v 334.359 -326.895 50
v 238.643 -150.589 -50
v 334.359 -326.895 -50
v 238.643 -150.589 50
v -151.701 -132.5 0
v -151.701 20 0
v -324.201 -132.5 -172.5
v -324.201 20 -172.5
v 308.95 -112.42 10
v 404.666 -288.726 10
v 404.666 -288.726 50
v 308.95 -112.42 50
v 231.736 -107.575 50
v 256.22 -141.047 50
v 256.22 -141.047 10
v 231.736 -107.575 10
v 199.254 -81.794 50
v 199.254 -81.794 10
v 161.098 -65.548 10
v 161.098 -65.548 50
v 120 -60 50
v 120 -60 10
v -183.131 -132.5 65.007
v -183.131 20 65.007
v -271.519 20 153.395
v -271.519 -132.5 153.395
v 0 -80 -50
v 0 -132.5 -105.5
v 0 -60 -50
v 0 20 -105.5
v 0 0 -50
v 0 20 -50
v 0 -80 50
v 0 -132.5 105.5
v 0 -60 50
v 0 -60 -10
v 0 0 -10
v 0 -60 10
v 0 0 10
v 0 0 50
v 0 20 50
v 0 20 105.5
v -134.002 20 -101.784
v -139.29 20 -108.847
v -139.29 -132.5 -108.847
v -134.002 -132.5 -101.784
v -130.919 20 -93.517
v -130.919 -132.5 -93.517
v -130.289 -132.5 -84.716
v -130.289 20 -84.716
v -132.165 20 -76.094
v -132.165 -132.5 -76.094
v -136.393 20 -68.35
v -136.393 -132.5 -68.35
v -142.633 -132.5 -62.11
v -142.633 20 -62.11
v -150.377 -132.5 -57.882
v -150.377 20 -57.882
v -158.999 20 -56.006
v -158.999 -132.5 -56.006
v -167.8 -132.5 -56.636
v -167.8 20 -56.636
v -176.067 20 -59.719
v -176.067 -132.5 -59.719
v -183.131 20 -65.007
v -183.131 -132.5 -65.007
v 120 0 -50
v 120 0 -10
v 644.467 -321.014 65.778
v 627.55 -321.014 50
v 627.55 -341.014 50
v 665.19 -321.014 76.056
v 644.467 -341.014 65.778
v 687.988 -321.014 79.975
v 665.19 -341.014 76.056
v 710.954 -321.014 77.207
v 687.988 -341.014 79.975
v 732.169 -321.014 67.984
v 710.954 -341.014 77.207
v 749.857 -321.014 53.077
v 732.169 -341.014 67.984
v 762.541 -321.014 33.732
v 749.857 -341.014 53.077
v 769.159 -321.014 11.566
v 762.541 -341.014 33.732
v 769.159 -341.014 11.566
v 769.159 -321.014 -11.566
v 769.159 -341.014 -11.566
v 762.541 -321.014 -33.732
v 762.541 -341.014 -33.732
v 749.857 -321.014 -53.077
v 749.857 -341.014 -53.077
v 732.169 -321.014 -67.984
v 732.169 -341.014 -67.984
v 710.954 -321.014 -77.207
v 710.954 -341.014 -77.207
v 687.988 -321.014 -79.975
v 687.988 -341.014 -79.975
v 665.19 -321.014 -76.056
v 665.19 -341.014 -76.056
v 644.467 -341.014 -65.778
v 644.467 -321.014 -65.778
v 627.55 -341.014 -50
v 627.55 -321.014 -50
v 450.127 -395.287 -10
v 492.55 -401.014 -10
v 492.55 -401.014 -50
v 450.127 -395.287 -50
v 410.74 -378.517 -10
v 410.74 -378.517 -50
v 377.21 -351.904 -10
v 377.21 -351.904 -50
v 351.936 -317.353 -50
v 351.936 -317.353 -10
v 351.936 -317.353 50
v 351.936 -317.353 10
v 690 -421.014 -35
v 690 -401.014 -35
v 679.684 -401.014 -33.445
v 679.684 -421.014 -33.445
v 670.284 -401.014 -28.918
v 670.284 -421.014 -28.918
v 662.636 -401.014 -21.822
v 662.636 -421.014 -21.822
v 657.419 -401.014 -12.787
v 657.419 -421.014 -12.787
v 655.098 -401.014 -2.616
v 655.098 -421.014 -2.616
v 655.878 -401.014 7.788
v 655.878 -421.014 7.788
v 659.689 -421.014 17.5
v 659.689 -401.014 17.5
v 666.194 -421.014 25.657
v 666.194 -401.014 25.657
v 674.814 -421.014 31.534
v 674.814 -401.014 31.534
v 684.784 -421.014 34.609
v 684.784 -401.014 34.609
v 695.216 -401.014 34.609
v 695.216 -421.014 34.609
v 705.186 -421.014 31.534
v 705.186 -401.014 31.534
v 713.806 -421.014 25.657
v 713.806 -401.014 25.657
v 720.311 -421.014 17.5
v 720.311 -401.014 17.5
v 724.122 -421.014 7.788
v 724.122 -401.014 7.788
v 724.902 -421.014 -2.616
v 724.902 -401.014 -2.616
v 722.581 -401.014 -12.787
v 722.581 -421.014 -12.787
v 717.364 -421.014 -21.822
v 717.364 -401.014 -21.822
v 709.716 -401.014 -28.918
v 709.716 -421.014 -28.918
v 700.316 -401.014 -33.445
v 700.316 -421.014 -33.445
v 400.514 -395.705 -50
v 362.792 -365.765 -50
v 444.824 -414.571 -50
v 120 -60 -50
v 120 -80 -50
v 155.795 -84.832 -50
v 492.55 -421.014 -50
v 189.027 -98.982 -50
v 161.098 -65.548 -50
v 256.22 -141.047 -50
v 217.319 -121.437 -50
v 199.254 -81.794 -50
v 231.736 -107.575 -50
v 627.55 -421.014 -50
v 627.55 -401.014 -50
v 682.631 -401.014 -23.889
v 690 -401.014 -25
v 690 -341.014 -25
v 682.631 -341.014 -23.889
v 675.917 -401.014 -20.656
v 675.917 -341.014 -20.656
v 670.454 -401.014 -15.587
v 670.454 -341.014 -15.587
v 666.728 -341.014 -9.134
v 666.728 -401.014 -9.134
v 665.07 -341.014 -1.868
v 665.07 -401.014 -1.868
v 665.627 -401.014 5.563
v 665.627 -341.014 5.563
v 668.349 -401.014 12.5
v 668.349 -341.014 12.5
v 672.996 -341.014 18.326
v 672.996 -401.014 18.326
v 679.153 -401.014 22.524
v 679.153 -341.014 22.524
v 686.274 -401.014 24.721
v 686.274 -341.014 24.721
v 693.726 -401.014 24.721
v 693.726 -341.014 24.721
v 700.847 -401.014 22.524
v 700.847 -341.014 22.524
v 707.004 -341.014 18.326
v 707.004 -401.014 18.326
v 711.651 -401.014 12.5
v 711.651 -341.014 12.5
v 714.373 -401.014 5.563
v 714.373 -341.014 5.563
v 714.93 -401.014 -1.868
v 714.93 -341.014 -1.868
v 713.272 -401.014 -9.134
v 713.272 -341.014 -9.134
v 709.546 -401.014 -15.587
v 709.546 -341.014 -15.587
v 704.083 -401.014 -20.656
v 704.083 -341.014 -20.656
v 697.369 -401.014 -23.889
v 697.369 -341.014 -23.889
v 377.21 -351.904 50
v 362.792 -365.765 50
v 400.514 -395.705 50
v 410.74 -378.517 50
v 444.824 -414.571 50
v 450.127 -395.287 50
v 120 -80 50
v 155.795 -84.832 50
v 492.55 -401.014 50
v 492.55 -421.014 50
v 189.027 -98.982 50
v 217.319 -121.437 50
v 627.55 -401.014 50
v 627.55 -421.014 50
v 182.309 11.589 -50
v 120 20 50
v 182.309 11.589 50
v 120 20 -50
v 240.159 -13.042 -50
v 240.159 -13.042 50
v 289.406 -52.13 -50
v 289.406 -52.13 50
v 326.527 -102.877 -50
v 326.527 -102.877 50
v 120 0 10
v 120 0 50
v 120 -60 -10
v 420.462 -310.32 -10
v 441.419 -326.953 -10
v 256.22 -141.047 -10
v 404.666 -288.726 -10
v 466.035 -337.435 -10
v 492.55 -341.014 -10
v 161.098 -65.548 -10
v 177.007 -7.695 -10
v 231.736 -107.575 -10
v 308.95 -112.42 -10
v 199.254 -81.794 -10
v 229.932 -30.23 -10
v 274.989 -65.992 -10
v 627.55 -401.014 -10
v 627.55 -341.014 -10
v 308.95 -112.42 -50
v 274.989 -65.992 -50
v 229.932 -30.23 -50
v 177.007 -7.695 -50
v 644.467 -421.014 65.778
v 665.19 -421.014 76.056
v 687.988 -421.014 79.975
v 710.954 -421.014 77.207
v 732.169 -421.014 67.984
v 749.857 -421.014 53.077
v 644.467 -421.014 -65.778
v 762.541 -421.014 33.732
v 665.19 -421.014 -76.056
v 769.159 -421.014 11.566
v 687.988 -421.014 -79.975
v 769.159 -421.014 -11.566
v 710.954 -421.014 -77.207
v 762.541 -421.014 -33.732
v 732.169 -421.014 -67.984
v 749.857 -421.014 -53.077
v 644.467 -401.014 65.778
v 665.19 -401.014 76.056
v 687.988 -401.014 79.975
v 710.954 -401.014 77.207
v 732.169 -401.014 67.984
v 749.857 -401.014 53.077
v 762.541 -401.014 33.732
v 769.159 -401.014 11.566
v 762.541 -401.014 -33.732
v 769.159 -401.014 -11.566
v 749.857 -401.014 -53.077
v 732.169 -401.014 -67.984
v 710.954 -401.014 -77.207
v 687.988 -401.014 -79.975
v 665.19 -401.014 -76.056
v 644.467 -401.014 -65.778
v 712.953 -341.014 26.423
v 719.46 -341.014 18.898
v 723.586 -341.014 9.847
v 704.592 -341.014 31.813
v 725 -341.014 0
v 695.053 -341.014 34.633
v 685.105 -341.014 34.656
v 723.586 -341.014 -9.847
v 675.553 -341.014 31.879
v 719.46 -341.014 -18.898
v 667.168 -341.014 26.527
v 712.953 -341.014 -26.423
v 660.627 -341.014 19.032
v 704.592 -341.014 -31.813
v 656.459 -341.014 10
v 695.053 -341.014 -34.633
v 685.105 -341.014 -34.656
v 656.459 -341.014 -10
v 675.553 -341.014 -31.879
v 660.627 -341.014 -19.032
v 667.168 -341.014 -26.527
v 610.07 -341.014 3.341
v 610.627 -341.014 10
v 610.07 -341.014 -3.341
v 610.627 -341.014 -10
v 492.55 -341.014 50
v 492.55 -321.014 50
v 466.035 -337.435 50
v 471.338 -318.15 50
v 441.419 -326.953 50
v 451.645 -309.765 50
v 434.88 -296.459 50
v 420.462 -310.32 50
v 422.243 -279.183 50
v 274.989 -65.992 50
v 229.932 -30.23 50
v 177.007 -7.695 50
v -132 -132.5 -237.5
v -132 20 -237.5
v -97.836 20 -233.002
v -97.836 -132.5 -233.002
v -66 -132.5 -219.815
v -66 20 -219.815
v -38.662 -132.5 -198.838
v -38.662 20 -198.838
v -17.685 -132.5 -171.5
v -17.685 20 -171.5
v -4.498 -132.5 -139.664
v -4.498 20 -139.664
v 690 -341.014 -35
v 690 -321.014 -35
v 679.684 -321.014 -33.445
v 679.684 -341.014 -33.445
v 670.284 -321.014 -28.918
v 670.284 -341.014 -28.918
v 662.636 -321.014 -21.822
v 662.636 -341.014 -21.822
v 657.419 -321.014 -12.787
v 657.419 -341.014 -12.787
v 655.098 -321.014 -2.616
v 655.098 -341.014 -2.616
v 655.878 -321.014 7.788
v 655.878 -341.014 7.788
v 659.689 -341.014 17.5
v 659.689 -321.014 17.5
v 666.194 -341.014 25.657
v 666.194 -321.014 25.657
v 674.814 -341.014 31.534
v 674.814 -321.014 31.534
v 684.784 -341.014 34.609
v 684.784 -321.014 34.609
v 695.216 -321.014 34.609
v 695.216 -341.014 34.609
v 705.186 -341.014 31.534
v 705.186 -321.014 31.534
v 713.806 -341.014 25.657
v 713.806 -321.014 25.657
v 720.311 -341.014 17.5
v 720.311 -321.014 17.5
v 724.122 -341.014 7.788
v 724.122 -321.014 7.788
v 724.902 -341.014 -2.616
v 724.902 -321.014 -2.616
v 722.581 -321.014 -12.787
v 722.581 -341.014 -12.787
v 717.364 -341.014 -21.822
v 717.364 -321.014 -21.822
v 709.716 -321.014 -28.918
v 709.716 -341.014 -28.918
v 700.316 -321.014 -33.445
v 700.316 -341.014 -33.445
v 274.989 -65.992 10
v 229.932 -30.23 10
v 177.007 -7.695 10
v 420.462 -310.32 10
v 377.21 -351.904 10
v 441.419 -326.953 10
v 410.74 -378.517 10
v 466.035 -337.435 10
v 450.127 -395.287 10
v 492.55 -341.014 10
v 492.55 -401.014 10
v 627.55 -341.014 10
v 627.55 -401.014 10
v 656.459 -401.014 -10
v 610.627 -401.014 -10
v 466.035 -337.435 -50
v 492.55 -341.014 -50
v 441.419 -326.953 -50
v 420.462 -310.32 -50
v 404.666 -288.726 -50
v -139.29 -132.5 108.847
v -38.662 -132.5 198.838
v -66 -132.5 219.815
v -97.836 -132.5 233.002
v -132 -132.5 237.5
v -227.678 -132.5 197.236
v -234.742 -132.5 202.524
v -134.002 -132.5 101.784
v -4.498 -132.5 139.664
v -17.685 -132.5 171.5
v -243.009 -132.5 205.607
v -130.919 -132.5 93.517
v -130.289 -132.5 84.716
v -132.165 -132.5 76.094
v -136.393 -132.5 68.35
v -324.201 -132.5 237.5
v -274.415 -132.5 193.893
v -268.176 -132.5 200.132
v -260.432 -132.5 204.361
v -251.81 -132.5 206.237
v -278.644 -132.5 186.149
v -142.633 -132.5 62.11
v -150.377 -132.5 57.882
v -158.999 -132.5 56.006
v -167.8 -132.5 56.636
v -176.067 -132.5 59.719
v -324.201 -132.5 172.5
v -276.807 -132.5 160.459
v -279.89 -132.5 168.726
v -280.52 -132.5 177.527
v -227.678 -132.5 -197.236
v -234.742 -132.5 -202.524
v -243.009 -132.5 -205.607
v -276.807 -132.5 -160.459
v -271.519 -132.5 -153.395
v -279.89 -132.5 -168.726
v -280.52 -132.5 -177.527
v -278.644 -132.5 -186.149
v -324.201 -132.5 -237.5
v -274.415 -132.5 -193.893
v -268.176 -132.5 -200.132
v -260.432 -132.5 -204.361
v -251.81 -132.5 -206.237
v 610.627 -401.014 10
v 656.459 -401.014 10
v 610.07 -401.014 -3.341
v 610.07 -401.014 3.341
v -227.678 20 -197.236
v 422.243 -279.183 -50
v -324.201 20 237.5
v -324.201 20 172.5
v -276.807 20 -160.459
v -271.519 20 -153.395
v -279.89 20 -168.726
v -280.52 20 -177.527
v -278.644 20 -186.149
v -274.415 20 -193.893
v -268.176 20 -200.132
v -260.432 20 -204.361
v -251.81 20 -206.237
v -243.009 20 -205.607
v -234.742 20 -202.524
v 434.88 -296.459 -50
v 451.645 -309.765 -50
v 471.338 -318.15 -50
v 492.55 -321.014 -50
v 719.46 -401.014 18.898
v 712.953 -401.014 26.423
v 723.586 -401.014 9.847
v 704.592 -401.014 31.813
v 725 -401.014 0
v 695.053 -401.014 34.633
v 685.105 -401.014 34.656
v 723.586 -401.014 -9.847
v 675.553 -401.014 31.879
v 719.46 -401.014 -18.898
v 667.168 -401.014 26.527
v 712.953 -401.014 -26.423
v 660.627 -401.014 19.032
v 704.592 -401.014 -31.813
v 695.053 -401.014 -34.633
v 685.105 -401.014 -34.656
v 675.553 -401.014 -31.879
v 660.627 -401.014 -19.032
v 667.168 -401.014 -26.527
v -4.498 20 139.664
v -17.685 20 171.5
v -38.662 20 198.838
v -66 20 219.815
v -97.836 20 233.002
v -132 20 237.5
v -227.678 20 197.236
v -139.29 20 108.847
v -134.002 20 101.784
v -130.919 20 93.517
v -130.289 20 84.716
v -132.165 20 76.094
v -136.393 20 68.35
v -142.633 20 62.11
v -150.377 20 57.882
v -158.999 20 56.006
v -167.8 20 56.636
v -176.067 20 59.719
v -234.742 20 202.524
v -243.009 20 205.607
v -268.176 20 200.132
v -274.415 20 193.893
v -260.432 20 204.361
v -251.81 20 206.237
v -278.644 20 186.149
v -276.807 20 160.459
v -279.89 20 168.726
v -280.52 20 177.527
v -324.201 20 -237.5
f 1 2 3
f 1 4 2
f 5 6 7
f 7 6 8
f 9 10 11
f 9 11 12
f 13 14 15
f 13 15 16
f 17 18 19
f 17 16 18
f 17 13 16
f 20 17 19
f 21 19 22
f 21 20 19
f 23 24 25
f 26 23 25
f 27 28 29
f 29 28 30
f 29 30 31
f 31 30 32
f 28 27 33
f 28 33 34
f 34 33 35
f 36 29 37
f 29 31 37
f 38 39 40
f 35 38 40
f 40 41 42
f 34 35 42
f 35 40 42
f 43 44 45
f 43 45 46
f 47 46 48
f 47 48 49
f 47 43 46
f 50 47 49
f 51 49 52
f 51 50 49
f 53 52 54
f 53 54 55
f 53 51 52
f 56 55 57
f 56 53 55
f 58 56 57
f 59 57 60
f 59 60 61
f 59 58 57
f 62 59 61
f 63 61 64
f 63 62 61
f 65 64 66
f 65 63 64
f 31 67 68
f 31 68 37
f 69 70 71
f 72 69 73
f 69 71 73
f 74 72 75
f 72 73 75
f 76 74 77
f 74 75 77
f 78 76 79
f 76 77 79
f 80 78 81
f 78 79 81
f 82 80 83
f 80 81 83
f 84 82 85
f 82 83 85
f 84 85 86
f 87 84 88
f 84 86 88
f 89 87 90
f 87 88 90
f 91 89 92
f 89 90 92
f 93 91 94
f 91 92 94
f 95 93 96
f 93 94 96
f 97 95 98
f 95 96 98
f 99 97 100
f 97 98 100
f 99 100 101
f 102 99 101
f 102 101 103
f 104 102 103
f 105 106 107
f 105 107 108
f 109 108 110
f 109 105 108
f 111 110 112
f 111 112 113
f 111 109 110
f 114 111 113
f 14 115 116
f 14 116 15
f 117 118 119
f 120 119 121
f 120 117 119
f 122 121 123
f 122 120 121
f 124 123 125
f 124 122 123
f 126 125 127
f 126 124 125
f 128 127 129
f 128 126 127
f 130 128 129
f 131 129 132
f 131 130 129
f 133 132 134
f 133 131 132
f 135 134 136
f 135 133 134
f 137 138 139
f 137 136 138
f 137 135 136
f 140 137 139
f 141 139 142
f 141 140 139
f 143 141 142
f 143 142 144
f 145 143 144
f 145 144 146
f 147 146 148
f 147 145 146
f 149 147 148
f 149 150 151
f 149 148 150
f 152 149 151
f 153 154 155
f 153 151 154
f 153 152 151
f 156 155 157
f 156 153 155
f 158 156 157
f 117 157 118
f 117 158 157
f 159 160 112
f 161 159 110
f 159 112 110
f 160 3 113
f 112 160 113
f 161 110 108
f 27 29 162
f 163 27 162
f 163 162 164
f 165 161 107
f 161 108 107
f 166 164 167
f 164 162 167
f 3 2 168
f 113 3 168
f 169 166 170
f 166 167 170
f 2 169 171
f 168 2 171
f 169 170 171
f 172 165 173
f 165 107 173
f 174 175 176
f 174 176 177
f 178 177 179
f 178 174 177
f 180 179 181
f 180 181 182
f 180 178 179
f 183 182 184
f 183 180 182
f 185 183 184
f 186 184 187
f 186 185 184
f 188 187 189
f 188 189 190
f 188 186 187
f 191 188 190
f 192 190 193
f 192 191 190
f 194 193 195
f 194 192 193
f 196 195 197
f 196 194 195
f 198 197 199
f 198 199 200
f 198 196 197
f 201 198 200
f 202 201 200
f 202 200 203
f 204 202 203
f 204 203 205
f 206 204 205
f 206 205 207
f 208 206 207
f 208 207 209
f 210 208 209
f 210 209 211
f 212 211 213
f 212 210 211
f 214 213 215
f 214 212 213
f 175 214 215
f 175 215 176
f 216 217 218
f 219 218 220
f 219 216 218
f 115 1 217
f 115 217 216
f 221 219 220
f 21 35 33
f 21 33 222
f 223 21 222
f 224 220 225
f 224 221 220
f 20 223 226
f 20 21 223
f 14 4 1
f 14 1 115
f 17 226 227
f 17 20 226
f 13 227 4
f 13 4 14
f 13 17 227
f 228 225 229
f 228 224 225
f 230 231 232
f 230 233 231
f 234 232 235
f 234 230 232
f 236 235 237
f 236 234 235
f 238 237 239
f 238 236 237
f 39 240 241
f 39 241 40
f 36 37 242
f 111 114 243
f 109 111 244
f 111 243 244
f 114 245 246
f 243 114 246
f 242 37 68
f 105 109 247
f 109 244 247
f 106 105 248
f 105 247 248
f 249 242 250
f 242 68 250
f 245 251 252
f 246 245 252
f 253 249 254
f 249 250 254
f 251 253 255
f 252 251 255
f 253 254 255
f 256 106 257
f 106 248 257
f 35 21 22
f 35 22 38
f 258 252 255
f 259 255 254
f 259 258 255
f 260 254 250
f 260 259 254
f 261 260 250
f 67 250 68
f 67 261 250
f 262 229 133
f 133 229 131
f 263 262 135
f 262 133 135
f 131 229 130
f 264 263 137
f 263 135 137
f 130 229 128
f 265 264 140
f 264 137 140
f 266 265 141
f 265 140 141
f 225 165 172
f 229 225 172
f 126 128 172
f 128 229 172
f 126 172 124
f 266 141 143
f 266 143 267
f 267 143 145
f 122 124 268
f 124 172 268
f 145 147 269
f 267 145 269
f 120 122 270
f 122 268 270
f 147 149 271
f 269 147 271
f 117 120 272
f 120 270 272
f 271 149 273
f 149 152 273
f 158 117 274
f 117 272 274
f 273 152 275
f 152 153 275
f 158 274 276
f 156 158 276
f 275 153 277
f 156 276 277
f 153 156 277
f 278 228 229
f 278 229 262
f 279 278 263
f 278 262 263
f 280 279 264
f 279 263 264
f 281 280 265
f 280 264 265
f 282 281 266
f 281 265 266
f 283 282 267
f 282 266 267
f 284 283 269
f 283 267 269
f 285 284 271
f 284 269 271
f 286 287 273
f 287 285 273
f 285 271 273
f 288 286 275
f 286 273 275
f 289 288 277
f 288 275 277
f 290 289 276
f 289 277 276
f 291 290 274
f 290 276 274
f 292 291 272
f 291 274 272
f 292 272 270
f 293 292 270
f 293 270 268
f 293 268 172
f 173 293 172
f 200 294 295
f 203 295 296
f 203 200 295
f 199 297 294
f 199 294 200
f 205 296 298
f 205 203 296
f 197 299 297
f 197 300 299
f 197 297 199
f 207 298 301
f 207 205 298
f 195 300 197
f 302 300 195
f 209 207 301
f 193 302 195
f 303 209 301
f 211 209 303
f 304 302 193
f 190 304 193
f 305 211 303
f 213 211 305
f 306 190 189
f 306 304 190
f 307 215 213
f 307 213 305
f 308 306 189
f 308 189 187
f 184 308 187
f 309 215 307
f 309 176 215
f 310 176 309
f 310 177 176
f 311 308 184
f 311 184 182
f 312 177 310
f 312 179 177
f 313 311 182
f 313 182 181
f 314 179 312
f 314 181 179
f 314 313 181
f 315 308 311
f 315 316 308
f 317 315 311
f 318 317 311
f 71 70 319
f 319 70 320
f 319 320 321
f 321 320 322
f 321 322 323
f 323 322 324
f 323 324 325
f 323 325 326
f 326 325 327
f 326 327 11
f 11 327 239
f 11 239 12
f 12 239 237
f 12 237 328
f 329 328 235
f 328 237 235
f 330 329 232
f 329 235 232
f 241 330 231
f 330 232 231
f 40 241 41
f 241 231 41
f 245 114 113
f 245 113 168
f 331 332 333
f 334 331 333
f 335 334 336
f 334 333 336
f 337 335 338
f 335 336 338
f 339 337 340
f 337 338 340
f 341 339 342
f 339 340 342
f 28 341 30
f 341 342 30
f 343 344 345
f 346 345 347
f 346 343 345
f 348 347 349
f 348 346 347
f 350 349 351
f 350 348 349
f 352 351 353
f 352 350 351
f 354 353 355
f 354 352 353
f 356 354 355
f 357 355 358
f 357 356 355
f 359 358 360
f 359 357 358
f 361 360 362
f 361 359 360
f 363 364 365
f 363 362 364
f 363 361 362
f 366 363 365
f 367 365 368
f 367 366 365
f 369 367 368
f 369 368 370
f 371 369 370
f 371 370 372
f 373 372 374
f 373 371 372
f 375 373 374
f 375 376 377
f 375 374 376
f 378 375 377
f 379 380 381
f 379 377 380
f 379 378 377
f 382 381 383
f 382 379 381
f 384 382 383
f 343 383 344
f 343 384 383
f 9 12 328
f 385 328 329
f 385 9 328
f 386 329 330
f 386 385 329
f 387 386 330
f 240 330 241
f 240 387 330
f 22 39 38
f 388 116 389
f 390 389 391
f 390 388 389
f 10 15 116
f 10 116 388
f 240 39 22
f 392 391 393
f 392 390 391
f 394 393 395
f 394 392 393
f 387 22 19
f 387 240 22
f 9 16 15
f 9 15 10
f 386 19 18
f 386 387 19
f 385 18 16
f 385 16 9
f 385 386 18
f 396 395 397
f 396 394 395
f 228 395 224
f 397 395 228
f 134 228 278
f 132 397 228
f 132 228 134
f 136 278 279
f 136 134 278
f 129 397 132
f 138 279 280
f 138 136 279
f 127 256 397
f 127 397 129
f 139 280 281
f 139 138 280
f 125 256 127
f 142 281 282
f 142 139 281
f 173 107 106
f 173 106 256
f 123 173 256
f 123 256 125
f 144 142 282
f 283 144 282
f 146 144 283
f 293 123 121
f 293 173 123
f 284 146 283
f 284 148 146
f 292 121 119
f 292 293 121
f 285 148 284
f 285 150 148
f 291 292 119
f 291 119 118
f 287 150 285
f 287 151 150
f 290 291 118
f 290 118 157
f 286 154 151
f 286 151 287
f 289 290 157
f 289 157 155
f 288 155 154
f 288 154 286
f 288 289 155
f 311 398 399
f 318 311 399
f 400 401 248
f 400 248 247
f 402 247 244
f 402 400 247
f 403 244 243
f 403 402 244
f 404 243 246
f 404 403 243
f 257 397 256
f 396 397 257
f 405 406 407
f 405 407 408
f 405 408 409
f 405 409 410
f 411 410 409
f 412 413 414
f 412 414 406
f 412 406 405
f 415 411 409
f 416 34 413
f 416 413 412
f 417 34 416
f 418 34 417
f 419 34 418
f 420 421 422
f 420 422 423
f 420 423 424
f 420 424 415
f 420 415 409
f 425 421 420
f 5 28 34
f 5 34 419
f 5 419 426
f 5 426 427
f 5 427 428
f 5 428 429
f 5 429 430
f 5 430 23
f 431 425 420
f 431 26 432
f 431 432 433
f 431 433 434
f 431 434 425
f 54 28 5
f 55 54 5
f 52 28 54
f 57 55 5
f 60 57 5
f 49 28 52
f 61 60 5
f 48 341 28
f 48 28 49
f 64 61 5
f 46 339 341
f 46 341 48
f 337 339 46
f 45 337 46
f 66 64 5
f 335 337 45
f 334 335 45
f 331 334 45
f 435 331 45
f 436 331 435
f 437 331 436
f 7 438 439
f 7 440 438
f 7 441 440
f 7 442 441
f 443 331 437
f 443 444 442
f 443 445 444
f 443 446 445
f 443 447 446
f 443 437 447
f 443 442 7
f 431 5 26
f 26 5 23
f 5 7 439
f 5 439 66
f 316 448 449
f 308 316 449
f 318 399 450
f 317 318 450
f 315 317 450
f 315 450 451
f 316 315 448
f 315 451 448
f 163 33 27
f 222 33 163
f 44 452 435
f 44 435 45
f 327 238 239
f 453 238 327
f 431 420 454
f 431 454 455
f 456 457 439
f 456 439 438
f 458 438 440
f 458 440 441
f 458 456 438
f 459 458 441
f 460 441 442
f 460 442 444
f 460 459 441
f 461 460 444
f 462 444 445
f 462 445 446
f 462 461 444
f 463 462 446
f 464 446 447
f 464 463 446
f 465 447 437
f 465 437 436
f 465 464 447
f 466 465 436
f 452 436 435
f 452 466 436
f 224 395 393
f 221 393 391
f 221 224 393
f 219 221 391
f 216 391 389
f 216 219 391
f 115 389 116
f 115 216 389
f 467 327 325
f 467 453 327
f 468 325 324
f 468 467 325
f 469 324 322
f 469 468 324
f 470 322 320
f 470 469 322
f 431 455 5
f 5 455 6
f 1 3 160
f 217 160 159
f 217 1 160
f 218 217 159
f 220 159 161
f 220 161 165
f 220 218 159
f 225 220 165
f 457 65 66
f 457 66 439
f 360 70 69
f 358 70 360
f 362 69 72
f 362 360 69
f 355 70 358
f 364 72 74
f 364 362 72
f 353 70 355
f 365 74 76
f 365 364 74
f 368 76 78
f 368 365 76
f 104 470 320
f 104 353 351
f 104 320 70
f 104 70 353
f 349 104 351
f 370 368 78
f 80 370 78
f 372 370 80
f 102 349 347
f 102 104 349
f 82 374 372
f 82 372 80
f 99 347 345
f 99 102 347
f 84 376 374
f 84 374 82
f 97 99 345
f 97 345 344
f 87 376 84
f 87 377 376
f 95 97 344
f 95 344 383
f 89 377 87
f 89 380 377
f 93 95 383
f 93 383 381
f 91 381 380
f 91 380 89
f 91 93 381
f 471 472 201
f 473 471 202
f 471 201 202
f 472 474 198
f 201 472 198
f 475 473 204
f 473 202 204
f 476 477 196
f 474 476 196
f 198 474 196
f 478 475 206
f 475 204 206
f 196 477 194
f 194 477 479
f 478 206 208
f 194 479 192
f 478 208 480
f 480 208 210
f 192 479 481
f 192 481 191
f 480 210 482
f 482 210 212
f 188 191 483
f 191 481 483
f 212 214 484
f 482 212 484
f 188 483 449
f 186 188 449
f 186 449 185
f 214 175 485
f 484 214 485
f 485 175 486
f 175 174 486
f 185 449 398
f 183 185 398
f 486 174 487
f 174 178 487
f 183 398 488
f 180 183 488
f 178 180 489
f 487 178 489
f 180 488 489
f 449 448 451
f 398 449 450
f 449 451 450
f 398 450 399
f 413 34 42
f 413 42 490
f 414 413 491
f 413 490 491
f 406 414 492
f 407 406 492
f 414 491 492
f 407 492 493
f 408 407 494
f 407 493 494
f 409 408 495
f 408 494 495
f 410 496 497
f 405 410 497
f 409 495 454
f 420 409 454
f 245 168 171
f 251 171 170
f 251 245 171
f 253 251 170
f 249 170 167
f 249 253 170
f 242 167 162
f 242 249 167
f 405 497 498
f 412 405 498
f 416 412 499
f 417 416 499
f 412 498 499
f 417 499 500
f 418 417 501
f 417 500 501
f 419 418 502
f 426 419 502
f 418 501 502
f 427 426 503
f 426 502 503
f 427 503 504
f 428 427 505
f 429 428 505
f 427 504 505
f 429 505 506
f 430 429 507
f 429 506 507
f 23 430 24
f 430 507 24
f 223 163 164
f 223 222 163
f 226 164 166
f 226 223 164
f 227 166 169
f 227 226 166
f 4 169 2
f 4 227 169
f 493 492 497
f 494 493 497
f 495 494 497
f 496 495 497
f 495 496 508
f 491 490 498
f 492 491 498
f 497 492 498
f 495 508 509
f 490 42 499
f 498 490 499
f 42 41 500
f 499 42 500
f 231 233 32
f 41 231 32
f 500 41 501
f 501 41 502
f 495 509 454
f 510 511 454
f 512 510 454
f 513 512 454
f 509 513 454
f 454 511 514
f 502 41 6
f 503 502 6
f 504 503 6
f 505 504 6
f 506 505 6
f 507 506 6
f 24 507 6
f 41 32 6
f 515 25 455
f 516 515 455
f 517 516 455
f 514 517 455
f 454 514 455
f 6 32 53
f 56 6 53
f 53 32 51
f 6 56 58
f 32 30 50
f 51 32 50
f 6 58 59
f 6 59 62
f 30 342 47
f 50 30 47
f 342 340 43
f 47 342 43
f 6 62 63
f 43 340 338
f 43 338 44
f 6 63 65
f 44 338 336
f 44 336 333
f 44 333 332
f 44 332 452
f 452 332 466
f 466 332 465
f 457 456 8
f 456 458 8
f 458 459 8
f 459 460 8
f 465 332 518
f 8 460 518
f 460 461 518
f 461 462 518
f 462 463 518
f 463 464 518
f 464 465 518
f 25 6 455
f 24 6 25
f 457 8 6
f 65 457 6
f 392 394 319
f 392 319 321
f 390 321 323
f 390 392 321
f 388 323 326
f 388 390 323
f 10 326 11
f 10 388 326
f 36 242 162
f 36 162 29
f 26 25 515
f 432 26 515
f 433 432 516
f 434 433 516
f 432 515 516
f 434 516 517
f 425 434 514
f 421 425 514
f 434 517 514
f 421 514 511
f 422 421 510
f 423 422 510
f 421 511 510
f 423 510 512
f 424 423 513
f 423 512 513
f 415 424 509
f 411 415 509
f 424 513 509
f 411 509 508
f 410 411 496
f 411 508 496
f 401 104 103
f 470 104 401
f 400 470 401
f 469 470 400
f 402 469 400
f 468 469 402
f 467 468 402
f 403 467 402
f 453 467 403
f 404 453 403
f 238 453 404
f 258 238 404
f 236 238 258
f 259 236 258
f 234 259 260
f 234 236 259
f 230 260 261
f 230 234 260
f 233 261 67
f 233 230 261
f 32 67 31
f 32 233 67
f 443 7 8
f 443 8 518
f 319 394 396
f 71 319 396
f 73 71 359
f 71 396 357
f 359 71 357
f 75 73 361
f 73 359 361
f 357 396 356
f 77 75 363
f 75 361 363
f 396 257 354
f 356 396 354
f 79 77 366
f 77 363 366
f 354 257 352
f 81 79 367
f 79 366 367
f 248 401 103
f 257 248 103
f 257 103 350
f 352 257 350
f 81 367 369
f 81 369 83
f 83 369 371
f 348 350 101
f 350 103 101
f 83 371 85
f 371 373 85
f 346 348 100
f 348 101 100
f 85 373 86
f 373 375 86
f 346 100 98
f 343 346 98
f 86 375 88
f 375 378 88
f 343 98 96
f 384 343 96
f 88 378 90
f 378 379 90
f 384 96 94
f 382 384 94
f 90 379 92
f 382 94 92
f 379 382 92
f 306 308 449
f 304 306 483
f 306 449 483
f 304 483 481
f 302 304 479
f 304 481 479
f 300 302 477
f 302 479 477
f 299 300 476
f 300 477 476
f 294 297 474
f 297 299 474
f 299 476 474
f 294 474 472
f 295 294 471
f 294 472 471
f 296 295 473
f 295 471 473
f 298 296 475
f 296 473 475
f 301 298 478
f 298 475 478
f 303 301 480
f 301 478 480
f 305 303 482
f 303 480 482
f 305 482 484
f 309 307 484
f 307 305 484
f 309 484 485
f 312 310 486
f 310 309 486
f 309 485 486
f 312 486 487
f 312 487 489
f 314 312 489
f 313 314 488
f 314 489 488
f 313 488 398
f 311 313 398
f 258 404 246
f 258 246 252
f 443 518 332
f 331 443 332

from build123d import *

# Parameters (mm, degrees)
BOSS_EXTRUDE1_DEPTH = 10
BOSS_EXTRUDE2_DEPTH = 50
BOSS_EXTRUDE5_START = 20
BOSS_EXTRUDE5_DEPTH = 152.5
BOSS_EXTRUDE6_START = -421.013827
SKETCH5_3_R         = 80
SKETCH5_3_R_2       = 35
BOSS_EXTRUDE6_DEPTH = 20
BOSS_EXTRUDE7_START = -341.013827
SKETCH5_4_R         = 80
SKETCH5_4_R_2       = 35
BOSS_EXTRUDE7_DEPTH = 20
BOSS_EXTRUDE8_START = -401.013827
SKETCH5_5_R         = 35
SKETCH5_5_R_2       = 25
BOSS_EXTRUDE8_DEPTH = 60


with BuildPart() as part:
    # Sketch3 → Boss-Extrude1 (new, symmetric)
    with BuildSketch(Plane.XY):
        with BuildLine():
            Line((256.220121409, -141.046781521), (351.935681127, -317.352633161))
            ThreePointArc((351.935681127, -317.352633161), (410.739881395, -378.516934204), (492.55, -401.013826989))
            Line((492.55, -401.013826989), (627.55, -401.013826989))
            Line((627.55, -401.013826989), (627.55, -341.013826989))
            Line((627.55, -341.013826989), (492.55, -341.013826989))
            ThreePointArc((492.55, -341.013826989), (441.418675872, -326.953268998), (404.666050704, -288.725580846))
            Line((404.666050704, -288.725580846), (308.950490986, -112.419729206))
            ThreePointArc((308.950490986, -112.419729206), (229.932346876, -30.23019968), (120, 0))
            Line((120, 0), (0, 0))
            Line((0, 0), (0, -60))
            Line((0, -60), (120, -60))
            ThreePointArc((120, -60), (199.253552399, -81.793864886), (256.220121409, -141.046781521))
        make_face()
    extrude(amount=BOSS_EXTRUDE1_DEPTH, both=True)

    # Sketch3<3> → Boss-Extrude2 (add, symmetric)
    with BuildSketch(Plane.XY):
        with BuildLine():
            ThreePointArc((422.242840563, -279.183230075), (451.644940697, -309.765380596), (492.55, -321.013826989))
            Line((492.55, -321.013826989), (627.55, -321.013826989))
            Line((627.55, -321.013826989), (627.55, -341.013826989))
            Line((627.55, -341.013826989), (492.55, -341.013826989))
            ThreePointArc((492.55, -341.013826989), (441.418675872, -326.953268998), (404.666050704, -288.725580846))
            Line((404.666050704, -288.725580846), (308.950490986, -112.419729206))
            ThreePointArc((308.950490986, -112.419729206), (229.932346876, -30.23019968), (120, 0))
            Line((120, 0), (0, 0))
            Line((0, 0), (0, 20))
            Line((0, 20), (120, 20))
            ThreePointArc((120, 20), (240.158611702, -13.042311278), (326.527280845, -102.877378435))
            Line((326.527280845, -102.877378435), (422.242840563, -279.183230075))
        make_face()
        with BuildLine():
            Line((238.643331549, -150.589132292), (334.358891267, -326.894983932))
            ThreePointArc((334.358891267, -326.894983932), (400.513616569, -395.704822605), (492.55, -421.013826989))
            Line((492.55, -421.013826989), (627.55, -421.013826989))
            Line((627.55, -421.013826989), (627.55, -401.013826989))
            Line((627.55, -401.013826989), (492.55, -401.013826989))
            ThreePointArc((492.55, -401.013826989), (410.739881395, -378.516934204), (351.935681127, -317.352633161))
            Line((351.935681127, -317.352633161), (256.220121409, -141.046781521))
            ThreePointArc((256.220121409, -141.046781521), (199.253552399, -81.793864886), (120, -60))
            Line((120, -60), (0, -60))
            Line((0, -60), (0, -80))
            Line((0, -80), (120, -80))
            ThreePointArc((120, -80), (189.027287573, -98.981753287), (238.643331549, -150.589132292))
        make_face()
    extrude(amount=BOSS_EXTRUDE2_DEPTH, both=True)

    # Sketch5 → Boss-Extrude5 (add)
    with BuildSketch(Plane(origin=(0, 0, 0), x_dir=(1, 0, 0), z_dir=(0, 1, 0)).offset(BOSS_EXTRUDE5_START)):
        with BuildLine():
            Line((0, 105.5), (0, -105.5))
            ThreePointArc((0, -105.5), (-38.661904883, -198.838095117), (-132, -237.5))
            Line((-132, -237.5), (-324.201420932, -237.5))
            Line((-324.201420932, -237.5), (-324.201420932, -172.5))
            Line((-324.201420932, -172.5), (-151.701420932, 0))
            Line((-151.701420932, 0), (-324.201420932, 172.5))
            Line((-324.201420932, 172.5), (-324.201420932, 237.5))
            Line((-324.201420932, 237.5), (-132, 237.5))
            ThreePointArc((-132, 237.5), (-38.661904883, 198.838095117), (0, 105.5))
        make_face()
        with BuildLine():
            ThreePointArc((-139.289922132, -108.847469931), (-139.289922132, -65.006849498), (-183.130542565, -65.006849498))
            Line((-183.130542565, -65.006849498), (-271.518890214, -153.395197146))
            ThreePointArc((-271.518890214, -153.395197146), (-271.518890214, -197.23581758), (-227.67826978, -197.23581758))
            Line((-227.67826978, -197.23581758), (-139.289922132, -108.847469931))
        make_face(mode=Mode.SUBTRACT)
        with BuildLine():
            Line((-227.67826978, 197.23581758), (-139.289922132, 108.847469931))
            ThreePointArc((-139.289922132, 108.847469931), (-139.289922132, 65.006849498), (-183.130542565, 65.006849498))
            Line((-183.130542565, 65.006849498), (-271.518890214, 153.395197146))
            ThreePointArc((-271.518890214, 153.395197146), (-271.518890214, 197.23581758), (-227.67826978, 197.23581758))
        make_face(mode=Mode.SUBTRACT)
    extrude(amount=-BOSS_EXTRUDE5_DEPTH)

    # Sketch5<3> → Boss-Extrude6 (add)
    # profile 1 of 3: a face of its own
    with BuildSketch(Plane(origin=(0, 0, 0), x_dir=(1, 0, 0), z_dir=(0, 1, 0)).offset(BOSS_EXTRUDE6_START)):
        with Locations((690, 0)):
            Circle(SKETCH5_3_R)
        with Locations(Location((690, 0, 0), (0, 0, 90))):
            Circle(SKETCH5_3_R_2, mode=Mode.SUBTRACT)
    # profile 2 of 3: a face of its own
    with BuildSketch(Plane(origin=(0, 0, 0), x_dir=(1, 0, 0), z_dir=(0, 1, 0)).offset(BOSS_EXTRUDE6_START)):
        with BuildLine():
            ThreePointArc((656.458980338, -10), (655, 0), (656.458980338, 10))
            Line((656.458980338, 10), (610.627460668, 10))
            ThreePointArc((610.627460668, 10), (610, 0), (610.627460668, -10))
            Line((610.627460668, -10), (656.458980338, -10))
        make_face()
    # profile 3 of 3: a face of its own
    with BuildSketch(Plane(origin=(0, 0, 0), x_dir=(1, 0, 0), z_dir=(0, 1, 0)).offset(BOSS_EXTRUDE6_START)):
        with BuildLine():
            Line((610.627460668, 10), (656.458980338, 10))
            ThreePointArc((656.458980338, 10), (695.052935375, 34.633334291), (725, 0))
            ThreePointArc((725, 0), (695.052935375, -34.633334291), (656.458980338, -10))
            Line((656.458980338, -10), (610.627460668, -10))
            ThreePointArc((610.627460668, -10), (695.009833003, -79.842980739), (770, 0))
            ThreePointArc((770, 0), (695.009833003, 79.842980739), (610.627460668, 10))
        make_face()
    extrude(amount=BOSS_EXTRUDE6_DEPTH)

    # Sketch5<4> → Boss-Extrude7 (add)
    # profile 1 of 3: a face of its own
    with BuildSketch(Plane(origin=(0, 0, 0), x_dir=(1, 0, 0), z_dir=(0, 1, 0)).offset(BOSS_EXTRUDE7_START)):
        with Locations((690, 0)):
            Circle(SKETCH5_4_R)
        with Locations(Location((690, 0, 0), (0, 0, 90))):
            Circle(SKETCH5_4_R_2, mode=Mode.SUBTRACT)
    # profile 2 of 3: a face of its own
    with BuildSketch(Plane(origin=(0, 0, 0), x_dir=(1, 0, 0), z_dir=(0, 1, 0)).offset(BOSS_EXTRUDE7_START)):
        with BuildLine():
            ThreePointArc((656.458980338, -10), (655, 0), (656.458980338, 10))
            Line((656.458980338, 10), (610.627460668, 10))
            ThreePointArc((610.627460668, 10), (610, 0), (610.627460668, -10))
            Line((610.627460668, -10), (656.458980338, -10))
        make_face()
    # profile 3 of 3: a face of its own
    with BuildSketch(Plane(origin=(0, 0, 0), x_dir=(1, 0, 0), z_dir=(0, 1, 0)).offset(BOSS_EXTRUDE7_START)):
        with BuildLine():
            Line((610.627460668, 10), (656.458980338, 10))
            ThreePointArc((656.458980338, 10), (695.052935375, 34.633334291), (725, 0))
            ThreePointArc((725, 0), (695.052935375, -34.633334291), (656.458980338, -10))
            Line((656.458980338, -10), (610.627460668, -10))
            ThreePointArc((610.627460668, -10), (695.009833003, -79.842980739), (770, 0))
            ThreePointArc((770, 0), (695.009833003, 79.842980739), (610.627460668, 10))
        make_face()
    extrude(amount=BOSS_EXTRUDE7_DEPTH)


with BuildPart() as body_2:
    # Sketch5<5> → Boss-Extrude8 (new body)
    # profile 1 of 2: a face of its own
    with BuildSketch(Plane(origin=(0, 0, 0), x_dir=(1, 0, 0), z_dir=(0, 1, 0)).offset(BOSS_EXTRUDE8_START)):
        with Locations(Location((690, 0, 0), (0, 0, 90))):
            Circle(SKETCH5_5_R)
        with Locations(Location((690, 0, 0), (0, 0, 90))):
            Circle(SKETCH5_5_R_2, mode=Mode.SUBTRACT)
    # profile 2 of 2: a face of its own
    with BuildSketch(Plane(origin=(0, 0, 0), x_dir=(1, 0, 0), z_dir=(0, 1, 0)).offset(BOSS_EXTRUDE8_START)):
        with BuildLine():
            ThreePointArc((656.458980338, -10), (655, 0), (656.458980338, 10))
            Line((656.458980338, 10), (610.627460668, 10))
            ThreePointArc((610.627460668, 10), (610, 0), (610.627460668, -10))
            Line((610.627460668, -10), (656.458980338, -10))
        make_face()
    extrude(amount=BOSS_EXTRUDE8_DEPTH)


solid = Compound([part.part, body_2.part])
